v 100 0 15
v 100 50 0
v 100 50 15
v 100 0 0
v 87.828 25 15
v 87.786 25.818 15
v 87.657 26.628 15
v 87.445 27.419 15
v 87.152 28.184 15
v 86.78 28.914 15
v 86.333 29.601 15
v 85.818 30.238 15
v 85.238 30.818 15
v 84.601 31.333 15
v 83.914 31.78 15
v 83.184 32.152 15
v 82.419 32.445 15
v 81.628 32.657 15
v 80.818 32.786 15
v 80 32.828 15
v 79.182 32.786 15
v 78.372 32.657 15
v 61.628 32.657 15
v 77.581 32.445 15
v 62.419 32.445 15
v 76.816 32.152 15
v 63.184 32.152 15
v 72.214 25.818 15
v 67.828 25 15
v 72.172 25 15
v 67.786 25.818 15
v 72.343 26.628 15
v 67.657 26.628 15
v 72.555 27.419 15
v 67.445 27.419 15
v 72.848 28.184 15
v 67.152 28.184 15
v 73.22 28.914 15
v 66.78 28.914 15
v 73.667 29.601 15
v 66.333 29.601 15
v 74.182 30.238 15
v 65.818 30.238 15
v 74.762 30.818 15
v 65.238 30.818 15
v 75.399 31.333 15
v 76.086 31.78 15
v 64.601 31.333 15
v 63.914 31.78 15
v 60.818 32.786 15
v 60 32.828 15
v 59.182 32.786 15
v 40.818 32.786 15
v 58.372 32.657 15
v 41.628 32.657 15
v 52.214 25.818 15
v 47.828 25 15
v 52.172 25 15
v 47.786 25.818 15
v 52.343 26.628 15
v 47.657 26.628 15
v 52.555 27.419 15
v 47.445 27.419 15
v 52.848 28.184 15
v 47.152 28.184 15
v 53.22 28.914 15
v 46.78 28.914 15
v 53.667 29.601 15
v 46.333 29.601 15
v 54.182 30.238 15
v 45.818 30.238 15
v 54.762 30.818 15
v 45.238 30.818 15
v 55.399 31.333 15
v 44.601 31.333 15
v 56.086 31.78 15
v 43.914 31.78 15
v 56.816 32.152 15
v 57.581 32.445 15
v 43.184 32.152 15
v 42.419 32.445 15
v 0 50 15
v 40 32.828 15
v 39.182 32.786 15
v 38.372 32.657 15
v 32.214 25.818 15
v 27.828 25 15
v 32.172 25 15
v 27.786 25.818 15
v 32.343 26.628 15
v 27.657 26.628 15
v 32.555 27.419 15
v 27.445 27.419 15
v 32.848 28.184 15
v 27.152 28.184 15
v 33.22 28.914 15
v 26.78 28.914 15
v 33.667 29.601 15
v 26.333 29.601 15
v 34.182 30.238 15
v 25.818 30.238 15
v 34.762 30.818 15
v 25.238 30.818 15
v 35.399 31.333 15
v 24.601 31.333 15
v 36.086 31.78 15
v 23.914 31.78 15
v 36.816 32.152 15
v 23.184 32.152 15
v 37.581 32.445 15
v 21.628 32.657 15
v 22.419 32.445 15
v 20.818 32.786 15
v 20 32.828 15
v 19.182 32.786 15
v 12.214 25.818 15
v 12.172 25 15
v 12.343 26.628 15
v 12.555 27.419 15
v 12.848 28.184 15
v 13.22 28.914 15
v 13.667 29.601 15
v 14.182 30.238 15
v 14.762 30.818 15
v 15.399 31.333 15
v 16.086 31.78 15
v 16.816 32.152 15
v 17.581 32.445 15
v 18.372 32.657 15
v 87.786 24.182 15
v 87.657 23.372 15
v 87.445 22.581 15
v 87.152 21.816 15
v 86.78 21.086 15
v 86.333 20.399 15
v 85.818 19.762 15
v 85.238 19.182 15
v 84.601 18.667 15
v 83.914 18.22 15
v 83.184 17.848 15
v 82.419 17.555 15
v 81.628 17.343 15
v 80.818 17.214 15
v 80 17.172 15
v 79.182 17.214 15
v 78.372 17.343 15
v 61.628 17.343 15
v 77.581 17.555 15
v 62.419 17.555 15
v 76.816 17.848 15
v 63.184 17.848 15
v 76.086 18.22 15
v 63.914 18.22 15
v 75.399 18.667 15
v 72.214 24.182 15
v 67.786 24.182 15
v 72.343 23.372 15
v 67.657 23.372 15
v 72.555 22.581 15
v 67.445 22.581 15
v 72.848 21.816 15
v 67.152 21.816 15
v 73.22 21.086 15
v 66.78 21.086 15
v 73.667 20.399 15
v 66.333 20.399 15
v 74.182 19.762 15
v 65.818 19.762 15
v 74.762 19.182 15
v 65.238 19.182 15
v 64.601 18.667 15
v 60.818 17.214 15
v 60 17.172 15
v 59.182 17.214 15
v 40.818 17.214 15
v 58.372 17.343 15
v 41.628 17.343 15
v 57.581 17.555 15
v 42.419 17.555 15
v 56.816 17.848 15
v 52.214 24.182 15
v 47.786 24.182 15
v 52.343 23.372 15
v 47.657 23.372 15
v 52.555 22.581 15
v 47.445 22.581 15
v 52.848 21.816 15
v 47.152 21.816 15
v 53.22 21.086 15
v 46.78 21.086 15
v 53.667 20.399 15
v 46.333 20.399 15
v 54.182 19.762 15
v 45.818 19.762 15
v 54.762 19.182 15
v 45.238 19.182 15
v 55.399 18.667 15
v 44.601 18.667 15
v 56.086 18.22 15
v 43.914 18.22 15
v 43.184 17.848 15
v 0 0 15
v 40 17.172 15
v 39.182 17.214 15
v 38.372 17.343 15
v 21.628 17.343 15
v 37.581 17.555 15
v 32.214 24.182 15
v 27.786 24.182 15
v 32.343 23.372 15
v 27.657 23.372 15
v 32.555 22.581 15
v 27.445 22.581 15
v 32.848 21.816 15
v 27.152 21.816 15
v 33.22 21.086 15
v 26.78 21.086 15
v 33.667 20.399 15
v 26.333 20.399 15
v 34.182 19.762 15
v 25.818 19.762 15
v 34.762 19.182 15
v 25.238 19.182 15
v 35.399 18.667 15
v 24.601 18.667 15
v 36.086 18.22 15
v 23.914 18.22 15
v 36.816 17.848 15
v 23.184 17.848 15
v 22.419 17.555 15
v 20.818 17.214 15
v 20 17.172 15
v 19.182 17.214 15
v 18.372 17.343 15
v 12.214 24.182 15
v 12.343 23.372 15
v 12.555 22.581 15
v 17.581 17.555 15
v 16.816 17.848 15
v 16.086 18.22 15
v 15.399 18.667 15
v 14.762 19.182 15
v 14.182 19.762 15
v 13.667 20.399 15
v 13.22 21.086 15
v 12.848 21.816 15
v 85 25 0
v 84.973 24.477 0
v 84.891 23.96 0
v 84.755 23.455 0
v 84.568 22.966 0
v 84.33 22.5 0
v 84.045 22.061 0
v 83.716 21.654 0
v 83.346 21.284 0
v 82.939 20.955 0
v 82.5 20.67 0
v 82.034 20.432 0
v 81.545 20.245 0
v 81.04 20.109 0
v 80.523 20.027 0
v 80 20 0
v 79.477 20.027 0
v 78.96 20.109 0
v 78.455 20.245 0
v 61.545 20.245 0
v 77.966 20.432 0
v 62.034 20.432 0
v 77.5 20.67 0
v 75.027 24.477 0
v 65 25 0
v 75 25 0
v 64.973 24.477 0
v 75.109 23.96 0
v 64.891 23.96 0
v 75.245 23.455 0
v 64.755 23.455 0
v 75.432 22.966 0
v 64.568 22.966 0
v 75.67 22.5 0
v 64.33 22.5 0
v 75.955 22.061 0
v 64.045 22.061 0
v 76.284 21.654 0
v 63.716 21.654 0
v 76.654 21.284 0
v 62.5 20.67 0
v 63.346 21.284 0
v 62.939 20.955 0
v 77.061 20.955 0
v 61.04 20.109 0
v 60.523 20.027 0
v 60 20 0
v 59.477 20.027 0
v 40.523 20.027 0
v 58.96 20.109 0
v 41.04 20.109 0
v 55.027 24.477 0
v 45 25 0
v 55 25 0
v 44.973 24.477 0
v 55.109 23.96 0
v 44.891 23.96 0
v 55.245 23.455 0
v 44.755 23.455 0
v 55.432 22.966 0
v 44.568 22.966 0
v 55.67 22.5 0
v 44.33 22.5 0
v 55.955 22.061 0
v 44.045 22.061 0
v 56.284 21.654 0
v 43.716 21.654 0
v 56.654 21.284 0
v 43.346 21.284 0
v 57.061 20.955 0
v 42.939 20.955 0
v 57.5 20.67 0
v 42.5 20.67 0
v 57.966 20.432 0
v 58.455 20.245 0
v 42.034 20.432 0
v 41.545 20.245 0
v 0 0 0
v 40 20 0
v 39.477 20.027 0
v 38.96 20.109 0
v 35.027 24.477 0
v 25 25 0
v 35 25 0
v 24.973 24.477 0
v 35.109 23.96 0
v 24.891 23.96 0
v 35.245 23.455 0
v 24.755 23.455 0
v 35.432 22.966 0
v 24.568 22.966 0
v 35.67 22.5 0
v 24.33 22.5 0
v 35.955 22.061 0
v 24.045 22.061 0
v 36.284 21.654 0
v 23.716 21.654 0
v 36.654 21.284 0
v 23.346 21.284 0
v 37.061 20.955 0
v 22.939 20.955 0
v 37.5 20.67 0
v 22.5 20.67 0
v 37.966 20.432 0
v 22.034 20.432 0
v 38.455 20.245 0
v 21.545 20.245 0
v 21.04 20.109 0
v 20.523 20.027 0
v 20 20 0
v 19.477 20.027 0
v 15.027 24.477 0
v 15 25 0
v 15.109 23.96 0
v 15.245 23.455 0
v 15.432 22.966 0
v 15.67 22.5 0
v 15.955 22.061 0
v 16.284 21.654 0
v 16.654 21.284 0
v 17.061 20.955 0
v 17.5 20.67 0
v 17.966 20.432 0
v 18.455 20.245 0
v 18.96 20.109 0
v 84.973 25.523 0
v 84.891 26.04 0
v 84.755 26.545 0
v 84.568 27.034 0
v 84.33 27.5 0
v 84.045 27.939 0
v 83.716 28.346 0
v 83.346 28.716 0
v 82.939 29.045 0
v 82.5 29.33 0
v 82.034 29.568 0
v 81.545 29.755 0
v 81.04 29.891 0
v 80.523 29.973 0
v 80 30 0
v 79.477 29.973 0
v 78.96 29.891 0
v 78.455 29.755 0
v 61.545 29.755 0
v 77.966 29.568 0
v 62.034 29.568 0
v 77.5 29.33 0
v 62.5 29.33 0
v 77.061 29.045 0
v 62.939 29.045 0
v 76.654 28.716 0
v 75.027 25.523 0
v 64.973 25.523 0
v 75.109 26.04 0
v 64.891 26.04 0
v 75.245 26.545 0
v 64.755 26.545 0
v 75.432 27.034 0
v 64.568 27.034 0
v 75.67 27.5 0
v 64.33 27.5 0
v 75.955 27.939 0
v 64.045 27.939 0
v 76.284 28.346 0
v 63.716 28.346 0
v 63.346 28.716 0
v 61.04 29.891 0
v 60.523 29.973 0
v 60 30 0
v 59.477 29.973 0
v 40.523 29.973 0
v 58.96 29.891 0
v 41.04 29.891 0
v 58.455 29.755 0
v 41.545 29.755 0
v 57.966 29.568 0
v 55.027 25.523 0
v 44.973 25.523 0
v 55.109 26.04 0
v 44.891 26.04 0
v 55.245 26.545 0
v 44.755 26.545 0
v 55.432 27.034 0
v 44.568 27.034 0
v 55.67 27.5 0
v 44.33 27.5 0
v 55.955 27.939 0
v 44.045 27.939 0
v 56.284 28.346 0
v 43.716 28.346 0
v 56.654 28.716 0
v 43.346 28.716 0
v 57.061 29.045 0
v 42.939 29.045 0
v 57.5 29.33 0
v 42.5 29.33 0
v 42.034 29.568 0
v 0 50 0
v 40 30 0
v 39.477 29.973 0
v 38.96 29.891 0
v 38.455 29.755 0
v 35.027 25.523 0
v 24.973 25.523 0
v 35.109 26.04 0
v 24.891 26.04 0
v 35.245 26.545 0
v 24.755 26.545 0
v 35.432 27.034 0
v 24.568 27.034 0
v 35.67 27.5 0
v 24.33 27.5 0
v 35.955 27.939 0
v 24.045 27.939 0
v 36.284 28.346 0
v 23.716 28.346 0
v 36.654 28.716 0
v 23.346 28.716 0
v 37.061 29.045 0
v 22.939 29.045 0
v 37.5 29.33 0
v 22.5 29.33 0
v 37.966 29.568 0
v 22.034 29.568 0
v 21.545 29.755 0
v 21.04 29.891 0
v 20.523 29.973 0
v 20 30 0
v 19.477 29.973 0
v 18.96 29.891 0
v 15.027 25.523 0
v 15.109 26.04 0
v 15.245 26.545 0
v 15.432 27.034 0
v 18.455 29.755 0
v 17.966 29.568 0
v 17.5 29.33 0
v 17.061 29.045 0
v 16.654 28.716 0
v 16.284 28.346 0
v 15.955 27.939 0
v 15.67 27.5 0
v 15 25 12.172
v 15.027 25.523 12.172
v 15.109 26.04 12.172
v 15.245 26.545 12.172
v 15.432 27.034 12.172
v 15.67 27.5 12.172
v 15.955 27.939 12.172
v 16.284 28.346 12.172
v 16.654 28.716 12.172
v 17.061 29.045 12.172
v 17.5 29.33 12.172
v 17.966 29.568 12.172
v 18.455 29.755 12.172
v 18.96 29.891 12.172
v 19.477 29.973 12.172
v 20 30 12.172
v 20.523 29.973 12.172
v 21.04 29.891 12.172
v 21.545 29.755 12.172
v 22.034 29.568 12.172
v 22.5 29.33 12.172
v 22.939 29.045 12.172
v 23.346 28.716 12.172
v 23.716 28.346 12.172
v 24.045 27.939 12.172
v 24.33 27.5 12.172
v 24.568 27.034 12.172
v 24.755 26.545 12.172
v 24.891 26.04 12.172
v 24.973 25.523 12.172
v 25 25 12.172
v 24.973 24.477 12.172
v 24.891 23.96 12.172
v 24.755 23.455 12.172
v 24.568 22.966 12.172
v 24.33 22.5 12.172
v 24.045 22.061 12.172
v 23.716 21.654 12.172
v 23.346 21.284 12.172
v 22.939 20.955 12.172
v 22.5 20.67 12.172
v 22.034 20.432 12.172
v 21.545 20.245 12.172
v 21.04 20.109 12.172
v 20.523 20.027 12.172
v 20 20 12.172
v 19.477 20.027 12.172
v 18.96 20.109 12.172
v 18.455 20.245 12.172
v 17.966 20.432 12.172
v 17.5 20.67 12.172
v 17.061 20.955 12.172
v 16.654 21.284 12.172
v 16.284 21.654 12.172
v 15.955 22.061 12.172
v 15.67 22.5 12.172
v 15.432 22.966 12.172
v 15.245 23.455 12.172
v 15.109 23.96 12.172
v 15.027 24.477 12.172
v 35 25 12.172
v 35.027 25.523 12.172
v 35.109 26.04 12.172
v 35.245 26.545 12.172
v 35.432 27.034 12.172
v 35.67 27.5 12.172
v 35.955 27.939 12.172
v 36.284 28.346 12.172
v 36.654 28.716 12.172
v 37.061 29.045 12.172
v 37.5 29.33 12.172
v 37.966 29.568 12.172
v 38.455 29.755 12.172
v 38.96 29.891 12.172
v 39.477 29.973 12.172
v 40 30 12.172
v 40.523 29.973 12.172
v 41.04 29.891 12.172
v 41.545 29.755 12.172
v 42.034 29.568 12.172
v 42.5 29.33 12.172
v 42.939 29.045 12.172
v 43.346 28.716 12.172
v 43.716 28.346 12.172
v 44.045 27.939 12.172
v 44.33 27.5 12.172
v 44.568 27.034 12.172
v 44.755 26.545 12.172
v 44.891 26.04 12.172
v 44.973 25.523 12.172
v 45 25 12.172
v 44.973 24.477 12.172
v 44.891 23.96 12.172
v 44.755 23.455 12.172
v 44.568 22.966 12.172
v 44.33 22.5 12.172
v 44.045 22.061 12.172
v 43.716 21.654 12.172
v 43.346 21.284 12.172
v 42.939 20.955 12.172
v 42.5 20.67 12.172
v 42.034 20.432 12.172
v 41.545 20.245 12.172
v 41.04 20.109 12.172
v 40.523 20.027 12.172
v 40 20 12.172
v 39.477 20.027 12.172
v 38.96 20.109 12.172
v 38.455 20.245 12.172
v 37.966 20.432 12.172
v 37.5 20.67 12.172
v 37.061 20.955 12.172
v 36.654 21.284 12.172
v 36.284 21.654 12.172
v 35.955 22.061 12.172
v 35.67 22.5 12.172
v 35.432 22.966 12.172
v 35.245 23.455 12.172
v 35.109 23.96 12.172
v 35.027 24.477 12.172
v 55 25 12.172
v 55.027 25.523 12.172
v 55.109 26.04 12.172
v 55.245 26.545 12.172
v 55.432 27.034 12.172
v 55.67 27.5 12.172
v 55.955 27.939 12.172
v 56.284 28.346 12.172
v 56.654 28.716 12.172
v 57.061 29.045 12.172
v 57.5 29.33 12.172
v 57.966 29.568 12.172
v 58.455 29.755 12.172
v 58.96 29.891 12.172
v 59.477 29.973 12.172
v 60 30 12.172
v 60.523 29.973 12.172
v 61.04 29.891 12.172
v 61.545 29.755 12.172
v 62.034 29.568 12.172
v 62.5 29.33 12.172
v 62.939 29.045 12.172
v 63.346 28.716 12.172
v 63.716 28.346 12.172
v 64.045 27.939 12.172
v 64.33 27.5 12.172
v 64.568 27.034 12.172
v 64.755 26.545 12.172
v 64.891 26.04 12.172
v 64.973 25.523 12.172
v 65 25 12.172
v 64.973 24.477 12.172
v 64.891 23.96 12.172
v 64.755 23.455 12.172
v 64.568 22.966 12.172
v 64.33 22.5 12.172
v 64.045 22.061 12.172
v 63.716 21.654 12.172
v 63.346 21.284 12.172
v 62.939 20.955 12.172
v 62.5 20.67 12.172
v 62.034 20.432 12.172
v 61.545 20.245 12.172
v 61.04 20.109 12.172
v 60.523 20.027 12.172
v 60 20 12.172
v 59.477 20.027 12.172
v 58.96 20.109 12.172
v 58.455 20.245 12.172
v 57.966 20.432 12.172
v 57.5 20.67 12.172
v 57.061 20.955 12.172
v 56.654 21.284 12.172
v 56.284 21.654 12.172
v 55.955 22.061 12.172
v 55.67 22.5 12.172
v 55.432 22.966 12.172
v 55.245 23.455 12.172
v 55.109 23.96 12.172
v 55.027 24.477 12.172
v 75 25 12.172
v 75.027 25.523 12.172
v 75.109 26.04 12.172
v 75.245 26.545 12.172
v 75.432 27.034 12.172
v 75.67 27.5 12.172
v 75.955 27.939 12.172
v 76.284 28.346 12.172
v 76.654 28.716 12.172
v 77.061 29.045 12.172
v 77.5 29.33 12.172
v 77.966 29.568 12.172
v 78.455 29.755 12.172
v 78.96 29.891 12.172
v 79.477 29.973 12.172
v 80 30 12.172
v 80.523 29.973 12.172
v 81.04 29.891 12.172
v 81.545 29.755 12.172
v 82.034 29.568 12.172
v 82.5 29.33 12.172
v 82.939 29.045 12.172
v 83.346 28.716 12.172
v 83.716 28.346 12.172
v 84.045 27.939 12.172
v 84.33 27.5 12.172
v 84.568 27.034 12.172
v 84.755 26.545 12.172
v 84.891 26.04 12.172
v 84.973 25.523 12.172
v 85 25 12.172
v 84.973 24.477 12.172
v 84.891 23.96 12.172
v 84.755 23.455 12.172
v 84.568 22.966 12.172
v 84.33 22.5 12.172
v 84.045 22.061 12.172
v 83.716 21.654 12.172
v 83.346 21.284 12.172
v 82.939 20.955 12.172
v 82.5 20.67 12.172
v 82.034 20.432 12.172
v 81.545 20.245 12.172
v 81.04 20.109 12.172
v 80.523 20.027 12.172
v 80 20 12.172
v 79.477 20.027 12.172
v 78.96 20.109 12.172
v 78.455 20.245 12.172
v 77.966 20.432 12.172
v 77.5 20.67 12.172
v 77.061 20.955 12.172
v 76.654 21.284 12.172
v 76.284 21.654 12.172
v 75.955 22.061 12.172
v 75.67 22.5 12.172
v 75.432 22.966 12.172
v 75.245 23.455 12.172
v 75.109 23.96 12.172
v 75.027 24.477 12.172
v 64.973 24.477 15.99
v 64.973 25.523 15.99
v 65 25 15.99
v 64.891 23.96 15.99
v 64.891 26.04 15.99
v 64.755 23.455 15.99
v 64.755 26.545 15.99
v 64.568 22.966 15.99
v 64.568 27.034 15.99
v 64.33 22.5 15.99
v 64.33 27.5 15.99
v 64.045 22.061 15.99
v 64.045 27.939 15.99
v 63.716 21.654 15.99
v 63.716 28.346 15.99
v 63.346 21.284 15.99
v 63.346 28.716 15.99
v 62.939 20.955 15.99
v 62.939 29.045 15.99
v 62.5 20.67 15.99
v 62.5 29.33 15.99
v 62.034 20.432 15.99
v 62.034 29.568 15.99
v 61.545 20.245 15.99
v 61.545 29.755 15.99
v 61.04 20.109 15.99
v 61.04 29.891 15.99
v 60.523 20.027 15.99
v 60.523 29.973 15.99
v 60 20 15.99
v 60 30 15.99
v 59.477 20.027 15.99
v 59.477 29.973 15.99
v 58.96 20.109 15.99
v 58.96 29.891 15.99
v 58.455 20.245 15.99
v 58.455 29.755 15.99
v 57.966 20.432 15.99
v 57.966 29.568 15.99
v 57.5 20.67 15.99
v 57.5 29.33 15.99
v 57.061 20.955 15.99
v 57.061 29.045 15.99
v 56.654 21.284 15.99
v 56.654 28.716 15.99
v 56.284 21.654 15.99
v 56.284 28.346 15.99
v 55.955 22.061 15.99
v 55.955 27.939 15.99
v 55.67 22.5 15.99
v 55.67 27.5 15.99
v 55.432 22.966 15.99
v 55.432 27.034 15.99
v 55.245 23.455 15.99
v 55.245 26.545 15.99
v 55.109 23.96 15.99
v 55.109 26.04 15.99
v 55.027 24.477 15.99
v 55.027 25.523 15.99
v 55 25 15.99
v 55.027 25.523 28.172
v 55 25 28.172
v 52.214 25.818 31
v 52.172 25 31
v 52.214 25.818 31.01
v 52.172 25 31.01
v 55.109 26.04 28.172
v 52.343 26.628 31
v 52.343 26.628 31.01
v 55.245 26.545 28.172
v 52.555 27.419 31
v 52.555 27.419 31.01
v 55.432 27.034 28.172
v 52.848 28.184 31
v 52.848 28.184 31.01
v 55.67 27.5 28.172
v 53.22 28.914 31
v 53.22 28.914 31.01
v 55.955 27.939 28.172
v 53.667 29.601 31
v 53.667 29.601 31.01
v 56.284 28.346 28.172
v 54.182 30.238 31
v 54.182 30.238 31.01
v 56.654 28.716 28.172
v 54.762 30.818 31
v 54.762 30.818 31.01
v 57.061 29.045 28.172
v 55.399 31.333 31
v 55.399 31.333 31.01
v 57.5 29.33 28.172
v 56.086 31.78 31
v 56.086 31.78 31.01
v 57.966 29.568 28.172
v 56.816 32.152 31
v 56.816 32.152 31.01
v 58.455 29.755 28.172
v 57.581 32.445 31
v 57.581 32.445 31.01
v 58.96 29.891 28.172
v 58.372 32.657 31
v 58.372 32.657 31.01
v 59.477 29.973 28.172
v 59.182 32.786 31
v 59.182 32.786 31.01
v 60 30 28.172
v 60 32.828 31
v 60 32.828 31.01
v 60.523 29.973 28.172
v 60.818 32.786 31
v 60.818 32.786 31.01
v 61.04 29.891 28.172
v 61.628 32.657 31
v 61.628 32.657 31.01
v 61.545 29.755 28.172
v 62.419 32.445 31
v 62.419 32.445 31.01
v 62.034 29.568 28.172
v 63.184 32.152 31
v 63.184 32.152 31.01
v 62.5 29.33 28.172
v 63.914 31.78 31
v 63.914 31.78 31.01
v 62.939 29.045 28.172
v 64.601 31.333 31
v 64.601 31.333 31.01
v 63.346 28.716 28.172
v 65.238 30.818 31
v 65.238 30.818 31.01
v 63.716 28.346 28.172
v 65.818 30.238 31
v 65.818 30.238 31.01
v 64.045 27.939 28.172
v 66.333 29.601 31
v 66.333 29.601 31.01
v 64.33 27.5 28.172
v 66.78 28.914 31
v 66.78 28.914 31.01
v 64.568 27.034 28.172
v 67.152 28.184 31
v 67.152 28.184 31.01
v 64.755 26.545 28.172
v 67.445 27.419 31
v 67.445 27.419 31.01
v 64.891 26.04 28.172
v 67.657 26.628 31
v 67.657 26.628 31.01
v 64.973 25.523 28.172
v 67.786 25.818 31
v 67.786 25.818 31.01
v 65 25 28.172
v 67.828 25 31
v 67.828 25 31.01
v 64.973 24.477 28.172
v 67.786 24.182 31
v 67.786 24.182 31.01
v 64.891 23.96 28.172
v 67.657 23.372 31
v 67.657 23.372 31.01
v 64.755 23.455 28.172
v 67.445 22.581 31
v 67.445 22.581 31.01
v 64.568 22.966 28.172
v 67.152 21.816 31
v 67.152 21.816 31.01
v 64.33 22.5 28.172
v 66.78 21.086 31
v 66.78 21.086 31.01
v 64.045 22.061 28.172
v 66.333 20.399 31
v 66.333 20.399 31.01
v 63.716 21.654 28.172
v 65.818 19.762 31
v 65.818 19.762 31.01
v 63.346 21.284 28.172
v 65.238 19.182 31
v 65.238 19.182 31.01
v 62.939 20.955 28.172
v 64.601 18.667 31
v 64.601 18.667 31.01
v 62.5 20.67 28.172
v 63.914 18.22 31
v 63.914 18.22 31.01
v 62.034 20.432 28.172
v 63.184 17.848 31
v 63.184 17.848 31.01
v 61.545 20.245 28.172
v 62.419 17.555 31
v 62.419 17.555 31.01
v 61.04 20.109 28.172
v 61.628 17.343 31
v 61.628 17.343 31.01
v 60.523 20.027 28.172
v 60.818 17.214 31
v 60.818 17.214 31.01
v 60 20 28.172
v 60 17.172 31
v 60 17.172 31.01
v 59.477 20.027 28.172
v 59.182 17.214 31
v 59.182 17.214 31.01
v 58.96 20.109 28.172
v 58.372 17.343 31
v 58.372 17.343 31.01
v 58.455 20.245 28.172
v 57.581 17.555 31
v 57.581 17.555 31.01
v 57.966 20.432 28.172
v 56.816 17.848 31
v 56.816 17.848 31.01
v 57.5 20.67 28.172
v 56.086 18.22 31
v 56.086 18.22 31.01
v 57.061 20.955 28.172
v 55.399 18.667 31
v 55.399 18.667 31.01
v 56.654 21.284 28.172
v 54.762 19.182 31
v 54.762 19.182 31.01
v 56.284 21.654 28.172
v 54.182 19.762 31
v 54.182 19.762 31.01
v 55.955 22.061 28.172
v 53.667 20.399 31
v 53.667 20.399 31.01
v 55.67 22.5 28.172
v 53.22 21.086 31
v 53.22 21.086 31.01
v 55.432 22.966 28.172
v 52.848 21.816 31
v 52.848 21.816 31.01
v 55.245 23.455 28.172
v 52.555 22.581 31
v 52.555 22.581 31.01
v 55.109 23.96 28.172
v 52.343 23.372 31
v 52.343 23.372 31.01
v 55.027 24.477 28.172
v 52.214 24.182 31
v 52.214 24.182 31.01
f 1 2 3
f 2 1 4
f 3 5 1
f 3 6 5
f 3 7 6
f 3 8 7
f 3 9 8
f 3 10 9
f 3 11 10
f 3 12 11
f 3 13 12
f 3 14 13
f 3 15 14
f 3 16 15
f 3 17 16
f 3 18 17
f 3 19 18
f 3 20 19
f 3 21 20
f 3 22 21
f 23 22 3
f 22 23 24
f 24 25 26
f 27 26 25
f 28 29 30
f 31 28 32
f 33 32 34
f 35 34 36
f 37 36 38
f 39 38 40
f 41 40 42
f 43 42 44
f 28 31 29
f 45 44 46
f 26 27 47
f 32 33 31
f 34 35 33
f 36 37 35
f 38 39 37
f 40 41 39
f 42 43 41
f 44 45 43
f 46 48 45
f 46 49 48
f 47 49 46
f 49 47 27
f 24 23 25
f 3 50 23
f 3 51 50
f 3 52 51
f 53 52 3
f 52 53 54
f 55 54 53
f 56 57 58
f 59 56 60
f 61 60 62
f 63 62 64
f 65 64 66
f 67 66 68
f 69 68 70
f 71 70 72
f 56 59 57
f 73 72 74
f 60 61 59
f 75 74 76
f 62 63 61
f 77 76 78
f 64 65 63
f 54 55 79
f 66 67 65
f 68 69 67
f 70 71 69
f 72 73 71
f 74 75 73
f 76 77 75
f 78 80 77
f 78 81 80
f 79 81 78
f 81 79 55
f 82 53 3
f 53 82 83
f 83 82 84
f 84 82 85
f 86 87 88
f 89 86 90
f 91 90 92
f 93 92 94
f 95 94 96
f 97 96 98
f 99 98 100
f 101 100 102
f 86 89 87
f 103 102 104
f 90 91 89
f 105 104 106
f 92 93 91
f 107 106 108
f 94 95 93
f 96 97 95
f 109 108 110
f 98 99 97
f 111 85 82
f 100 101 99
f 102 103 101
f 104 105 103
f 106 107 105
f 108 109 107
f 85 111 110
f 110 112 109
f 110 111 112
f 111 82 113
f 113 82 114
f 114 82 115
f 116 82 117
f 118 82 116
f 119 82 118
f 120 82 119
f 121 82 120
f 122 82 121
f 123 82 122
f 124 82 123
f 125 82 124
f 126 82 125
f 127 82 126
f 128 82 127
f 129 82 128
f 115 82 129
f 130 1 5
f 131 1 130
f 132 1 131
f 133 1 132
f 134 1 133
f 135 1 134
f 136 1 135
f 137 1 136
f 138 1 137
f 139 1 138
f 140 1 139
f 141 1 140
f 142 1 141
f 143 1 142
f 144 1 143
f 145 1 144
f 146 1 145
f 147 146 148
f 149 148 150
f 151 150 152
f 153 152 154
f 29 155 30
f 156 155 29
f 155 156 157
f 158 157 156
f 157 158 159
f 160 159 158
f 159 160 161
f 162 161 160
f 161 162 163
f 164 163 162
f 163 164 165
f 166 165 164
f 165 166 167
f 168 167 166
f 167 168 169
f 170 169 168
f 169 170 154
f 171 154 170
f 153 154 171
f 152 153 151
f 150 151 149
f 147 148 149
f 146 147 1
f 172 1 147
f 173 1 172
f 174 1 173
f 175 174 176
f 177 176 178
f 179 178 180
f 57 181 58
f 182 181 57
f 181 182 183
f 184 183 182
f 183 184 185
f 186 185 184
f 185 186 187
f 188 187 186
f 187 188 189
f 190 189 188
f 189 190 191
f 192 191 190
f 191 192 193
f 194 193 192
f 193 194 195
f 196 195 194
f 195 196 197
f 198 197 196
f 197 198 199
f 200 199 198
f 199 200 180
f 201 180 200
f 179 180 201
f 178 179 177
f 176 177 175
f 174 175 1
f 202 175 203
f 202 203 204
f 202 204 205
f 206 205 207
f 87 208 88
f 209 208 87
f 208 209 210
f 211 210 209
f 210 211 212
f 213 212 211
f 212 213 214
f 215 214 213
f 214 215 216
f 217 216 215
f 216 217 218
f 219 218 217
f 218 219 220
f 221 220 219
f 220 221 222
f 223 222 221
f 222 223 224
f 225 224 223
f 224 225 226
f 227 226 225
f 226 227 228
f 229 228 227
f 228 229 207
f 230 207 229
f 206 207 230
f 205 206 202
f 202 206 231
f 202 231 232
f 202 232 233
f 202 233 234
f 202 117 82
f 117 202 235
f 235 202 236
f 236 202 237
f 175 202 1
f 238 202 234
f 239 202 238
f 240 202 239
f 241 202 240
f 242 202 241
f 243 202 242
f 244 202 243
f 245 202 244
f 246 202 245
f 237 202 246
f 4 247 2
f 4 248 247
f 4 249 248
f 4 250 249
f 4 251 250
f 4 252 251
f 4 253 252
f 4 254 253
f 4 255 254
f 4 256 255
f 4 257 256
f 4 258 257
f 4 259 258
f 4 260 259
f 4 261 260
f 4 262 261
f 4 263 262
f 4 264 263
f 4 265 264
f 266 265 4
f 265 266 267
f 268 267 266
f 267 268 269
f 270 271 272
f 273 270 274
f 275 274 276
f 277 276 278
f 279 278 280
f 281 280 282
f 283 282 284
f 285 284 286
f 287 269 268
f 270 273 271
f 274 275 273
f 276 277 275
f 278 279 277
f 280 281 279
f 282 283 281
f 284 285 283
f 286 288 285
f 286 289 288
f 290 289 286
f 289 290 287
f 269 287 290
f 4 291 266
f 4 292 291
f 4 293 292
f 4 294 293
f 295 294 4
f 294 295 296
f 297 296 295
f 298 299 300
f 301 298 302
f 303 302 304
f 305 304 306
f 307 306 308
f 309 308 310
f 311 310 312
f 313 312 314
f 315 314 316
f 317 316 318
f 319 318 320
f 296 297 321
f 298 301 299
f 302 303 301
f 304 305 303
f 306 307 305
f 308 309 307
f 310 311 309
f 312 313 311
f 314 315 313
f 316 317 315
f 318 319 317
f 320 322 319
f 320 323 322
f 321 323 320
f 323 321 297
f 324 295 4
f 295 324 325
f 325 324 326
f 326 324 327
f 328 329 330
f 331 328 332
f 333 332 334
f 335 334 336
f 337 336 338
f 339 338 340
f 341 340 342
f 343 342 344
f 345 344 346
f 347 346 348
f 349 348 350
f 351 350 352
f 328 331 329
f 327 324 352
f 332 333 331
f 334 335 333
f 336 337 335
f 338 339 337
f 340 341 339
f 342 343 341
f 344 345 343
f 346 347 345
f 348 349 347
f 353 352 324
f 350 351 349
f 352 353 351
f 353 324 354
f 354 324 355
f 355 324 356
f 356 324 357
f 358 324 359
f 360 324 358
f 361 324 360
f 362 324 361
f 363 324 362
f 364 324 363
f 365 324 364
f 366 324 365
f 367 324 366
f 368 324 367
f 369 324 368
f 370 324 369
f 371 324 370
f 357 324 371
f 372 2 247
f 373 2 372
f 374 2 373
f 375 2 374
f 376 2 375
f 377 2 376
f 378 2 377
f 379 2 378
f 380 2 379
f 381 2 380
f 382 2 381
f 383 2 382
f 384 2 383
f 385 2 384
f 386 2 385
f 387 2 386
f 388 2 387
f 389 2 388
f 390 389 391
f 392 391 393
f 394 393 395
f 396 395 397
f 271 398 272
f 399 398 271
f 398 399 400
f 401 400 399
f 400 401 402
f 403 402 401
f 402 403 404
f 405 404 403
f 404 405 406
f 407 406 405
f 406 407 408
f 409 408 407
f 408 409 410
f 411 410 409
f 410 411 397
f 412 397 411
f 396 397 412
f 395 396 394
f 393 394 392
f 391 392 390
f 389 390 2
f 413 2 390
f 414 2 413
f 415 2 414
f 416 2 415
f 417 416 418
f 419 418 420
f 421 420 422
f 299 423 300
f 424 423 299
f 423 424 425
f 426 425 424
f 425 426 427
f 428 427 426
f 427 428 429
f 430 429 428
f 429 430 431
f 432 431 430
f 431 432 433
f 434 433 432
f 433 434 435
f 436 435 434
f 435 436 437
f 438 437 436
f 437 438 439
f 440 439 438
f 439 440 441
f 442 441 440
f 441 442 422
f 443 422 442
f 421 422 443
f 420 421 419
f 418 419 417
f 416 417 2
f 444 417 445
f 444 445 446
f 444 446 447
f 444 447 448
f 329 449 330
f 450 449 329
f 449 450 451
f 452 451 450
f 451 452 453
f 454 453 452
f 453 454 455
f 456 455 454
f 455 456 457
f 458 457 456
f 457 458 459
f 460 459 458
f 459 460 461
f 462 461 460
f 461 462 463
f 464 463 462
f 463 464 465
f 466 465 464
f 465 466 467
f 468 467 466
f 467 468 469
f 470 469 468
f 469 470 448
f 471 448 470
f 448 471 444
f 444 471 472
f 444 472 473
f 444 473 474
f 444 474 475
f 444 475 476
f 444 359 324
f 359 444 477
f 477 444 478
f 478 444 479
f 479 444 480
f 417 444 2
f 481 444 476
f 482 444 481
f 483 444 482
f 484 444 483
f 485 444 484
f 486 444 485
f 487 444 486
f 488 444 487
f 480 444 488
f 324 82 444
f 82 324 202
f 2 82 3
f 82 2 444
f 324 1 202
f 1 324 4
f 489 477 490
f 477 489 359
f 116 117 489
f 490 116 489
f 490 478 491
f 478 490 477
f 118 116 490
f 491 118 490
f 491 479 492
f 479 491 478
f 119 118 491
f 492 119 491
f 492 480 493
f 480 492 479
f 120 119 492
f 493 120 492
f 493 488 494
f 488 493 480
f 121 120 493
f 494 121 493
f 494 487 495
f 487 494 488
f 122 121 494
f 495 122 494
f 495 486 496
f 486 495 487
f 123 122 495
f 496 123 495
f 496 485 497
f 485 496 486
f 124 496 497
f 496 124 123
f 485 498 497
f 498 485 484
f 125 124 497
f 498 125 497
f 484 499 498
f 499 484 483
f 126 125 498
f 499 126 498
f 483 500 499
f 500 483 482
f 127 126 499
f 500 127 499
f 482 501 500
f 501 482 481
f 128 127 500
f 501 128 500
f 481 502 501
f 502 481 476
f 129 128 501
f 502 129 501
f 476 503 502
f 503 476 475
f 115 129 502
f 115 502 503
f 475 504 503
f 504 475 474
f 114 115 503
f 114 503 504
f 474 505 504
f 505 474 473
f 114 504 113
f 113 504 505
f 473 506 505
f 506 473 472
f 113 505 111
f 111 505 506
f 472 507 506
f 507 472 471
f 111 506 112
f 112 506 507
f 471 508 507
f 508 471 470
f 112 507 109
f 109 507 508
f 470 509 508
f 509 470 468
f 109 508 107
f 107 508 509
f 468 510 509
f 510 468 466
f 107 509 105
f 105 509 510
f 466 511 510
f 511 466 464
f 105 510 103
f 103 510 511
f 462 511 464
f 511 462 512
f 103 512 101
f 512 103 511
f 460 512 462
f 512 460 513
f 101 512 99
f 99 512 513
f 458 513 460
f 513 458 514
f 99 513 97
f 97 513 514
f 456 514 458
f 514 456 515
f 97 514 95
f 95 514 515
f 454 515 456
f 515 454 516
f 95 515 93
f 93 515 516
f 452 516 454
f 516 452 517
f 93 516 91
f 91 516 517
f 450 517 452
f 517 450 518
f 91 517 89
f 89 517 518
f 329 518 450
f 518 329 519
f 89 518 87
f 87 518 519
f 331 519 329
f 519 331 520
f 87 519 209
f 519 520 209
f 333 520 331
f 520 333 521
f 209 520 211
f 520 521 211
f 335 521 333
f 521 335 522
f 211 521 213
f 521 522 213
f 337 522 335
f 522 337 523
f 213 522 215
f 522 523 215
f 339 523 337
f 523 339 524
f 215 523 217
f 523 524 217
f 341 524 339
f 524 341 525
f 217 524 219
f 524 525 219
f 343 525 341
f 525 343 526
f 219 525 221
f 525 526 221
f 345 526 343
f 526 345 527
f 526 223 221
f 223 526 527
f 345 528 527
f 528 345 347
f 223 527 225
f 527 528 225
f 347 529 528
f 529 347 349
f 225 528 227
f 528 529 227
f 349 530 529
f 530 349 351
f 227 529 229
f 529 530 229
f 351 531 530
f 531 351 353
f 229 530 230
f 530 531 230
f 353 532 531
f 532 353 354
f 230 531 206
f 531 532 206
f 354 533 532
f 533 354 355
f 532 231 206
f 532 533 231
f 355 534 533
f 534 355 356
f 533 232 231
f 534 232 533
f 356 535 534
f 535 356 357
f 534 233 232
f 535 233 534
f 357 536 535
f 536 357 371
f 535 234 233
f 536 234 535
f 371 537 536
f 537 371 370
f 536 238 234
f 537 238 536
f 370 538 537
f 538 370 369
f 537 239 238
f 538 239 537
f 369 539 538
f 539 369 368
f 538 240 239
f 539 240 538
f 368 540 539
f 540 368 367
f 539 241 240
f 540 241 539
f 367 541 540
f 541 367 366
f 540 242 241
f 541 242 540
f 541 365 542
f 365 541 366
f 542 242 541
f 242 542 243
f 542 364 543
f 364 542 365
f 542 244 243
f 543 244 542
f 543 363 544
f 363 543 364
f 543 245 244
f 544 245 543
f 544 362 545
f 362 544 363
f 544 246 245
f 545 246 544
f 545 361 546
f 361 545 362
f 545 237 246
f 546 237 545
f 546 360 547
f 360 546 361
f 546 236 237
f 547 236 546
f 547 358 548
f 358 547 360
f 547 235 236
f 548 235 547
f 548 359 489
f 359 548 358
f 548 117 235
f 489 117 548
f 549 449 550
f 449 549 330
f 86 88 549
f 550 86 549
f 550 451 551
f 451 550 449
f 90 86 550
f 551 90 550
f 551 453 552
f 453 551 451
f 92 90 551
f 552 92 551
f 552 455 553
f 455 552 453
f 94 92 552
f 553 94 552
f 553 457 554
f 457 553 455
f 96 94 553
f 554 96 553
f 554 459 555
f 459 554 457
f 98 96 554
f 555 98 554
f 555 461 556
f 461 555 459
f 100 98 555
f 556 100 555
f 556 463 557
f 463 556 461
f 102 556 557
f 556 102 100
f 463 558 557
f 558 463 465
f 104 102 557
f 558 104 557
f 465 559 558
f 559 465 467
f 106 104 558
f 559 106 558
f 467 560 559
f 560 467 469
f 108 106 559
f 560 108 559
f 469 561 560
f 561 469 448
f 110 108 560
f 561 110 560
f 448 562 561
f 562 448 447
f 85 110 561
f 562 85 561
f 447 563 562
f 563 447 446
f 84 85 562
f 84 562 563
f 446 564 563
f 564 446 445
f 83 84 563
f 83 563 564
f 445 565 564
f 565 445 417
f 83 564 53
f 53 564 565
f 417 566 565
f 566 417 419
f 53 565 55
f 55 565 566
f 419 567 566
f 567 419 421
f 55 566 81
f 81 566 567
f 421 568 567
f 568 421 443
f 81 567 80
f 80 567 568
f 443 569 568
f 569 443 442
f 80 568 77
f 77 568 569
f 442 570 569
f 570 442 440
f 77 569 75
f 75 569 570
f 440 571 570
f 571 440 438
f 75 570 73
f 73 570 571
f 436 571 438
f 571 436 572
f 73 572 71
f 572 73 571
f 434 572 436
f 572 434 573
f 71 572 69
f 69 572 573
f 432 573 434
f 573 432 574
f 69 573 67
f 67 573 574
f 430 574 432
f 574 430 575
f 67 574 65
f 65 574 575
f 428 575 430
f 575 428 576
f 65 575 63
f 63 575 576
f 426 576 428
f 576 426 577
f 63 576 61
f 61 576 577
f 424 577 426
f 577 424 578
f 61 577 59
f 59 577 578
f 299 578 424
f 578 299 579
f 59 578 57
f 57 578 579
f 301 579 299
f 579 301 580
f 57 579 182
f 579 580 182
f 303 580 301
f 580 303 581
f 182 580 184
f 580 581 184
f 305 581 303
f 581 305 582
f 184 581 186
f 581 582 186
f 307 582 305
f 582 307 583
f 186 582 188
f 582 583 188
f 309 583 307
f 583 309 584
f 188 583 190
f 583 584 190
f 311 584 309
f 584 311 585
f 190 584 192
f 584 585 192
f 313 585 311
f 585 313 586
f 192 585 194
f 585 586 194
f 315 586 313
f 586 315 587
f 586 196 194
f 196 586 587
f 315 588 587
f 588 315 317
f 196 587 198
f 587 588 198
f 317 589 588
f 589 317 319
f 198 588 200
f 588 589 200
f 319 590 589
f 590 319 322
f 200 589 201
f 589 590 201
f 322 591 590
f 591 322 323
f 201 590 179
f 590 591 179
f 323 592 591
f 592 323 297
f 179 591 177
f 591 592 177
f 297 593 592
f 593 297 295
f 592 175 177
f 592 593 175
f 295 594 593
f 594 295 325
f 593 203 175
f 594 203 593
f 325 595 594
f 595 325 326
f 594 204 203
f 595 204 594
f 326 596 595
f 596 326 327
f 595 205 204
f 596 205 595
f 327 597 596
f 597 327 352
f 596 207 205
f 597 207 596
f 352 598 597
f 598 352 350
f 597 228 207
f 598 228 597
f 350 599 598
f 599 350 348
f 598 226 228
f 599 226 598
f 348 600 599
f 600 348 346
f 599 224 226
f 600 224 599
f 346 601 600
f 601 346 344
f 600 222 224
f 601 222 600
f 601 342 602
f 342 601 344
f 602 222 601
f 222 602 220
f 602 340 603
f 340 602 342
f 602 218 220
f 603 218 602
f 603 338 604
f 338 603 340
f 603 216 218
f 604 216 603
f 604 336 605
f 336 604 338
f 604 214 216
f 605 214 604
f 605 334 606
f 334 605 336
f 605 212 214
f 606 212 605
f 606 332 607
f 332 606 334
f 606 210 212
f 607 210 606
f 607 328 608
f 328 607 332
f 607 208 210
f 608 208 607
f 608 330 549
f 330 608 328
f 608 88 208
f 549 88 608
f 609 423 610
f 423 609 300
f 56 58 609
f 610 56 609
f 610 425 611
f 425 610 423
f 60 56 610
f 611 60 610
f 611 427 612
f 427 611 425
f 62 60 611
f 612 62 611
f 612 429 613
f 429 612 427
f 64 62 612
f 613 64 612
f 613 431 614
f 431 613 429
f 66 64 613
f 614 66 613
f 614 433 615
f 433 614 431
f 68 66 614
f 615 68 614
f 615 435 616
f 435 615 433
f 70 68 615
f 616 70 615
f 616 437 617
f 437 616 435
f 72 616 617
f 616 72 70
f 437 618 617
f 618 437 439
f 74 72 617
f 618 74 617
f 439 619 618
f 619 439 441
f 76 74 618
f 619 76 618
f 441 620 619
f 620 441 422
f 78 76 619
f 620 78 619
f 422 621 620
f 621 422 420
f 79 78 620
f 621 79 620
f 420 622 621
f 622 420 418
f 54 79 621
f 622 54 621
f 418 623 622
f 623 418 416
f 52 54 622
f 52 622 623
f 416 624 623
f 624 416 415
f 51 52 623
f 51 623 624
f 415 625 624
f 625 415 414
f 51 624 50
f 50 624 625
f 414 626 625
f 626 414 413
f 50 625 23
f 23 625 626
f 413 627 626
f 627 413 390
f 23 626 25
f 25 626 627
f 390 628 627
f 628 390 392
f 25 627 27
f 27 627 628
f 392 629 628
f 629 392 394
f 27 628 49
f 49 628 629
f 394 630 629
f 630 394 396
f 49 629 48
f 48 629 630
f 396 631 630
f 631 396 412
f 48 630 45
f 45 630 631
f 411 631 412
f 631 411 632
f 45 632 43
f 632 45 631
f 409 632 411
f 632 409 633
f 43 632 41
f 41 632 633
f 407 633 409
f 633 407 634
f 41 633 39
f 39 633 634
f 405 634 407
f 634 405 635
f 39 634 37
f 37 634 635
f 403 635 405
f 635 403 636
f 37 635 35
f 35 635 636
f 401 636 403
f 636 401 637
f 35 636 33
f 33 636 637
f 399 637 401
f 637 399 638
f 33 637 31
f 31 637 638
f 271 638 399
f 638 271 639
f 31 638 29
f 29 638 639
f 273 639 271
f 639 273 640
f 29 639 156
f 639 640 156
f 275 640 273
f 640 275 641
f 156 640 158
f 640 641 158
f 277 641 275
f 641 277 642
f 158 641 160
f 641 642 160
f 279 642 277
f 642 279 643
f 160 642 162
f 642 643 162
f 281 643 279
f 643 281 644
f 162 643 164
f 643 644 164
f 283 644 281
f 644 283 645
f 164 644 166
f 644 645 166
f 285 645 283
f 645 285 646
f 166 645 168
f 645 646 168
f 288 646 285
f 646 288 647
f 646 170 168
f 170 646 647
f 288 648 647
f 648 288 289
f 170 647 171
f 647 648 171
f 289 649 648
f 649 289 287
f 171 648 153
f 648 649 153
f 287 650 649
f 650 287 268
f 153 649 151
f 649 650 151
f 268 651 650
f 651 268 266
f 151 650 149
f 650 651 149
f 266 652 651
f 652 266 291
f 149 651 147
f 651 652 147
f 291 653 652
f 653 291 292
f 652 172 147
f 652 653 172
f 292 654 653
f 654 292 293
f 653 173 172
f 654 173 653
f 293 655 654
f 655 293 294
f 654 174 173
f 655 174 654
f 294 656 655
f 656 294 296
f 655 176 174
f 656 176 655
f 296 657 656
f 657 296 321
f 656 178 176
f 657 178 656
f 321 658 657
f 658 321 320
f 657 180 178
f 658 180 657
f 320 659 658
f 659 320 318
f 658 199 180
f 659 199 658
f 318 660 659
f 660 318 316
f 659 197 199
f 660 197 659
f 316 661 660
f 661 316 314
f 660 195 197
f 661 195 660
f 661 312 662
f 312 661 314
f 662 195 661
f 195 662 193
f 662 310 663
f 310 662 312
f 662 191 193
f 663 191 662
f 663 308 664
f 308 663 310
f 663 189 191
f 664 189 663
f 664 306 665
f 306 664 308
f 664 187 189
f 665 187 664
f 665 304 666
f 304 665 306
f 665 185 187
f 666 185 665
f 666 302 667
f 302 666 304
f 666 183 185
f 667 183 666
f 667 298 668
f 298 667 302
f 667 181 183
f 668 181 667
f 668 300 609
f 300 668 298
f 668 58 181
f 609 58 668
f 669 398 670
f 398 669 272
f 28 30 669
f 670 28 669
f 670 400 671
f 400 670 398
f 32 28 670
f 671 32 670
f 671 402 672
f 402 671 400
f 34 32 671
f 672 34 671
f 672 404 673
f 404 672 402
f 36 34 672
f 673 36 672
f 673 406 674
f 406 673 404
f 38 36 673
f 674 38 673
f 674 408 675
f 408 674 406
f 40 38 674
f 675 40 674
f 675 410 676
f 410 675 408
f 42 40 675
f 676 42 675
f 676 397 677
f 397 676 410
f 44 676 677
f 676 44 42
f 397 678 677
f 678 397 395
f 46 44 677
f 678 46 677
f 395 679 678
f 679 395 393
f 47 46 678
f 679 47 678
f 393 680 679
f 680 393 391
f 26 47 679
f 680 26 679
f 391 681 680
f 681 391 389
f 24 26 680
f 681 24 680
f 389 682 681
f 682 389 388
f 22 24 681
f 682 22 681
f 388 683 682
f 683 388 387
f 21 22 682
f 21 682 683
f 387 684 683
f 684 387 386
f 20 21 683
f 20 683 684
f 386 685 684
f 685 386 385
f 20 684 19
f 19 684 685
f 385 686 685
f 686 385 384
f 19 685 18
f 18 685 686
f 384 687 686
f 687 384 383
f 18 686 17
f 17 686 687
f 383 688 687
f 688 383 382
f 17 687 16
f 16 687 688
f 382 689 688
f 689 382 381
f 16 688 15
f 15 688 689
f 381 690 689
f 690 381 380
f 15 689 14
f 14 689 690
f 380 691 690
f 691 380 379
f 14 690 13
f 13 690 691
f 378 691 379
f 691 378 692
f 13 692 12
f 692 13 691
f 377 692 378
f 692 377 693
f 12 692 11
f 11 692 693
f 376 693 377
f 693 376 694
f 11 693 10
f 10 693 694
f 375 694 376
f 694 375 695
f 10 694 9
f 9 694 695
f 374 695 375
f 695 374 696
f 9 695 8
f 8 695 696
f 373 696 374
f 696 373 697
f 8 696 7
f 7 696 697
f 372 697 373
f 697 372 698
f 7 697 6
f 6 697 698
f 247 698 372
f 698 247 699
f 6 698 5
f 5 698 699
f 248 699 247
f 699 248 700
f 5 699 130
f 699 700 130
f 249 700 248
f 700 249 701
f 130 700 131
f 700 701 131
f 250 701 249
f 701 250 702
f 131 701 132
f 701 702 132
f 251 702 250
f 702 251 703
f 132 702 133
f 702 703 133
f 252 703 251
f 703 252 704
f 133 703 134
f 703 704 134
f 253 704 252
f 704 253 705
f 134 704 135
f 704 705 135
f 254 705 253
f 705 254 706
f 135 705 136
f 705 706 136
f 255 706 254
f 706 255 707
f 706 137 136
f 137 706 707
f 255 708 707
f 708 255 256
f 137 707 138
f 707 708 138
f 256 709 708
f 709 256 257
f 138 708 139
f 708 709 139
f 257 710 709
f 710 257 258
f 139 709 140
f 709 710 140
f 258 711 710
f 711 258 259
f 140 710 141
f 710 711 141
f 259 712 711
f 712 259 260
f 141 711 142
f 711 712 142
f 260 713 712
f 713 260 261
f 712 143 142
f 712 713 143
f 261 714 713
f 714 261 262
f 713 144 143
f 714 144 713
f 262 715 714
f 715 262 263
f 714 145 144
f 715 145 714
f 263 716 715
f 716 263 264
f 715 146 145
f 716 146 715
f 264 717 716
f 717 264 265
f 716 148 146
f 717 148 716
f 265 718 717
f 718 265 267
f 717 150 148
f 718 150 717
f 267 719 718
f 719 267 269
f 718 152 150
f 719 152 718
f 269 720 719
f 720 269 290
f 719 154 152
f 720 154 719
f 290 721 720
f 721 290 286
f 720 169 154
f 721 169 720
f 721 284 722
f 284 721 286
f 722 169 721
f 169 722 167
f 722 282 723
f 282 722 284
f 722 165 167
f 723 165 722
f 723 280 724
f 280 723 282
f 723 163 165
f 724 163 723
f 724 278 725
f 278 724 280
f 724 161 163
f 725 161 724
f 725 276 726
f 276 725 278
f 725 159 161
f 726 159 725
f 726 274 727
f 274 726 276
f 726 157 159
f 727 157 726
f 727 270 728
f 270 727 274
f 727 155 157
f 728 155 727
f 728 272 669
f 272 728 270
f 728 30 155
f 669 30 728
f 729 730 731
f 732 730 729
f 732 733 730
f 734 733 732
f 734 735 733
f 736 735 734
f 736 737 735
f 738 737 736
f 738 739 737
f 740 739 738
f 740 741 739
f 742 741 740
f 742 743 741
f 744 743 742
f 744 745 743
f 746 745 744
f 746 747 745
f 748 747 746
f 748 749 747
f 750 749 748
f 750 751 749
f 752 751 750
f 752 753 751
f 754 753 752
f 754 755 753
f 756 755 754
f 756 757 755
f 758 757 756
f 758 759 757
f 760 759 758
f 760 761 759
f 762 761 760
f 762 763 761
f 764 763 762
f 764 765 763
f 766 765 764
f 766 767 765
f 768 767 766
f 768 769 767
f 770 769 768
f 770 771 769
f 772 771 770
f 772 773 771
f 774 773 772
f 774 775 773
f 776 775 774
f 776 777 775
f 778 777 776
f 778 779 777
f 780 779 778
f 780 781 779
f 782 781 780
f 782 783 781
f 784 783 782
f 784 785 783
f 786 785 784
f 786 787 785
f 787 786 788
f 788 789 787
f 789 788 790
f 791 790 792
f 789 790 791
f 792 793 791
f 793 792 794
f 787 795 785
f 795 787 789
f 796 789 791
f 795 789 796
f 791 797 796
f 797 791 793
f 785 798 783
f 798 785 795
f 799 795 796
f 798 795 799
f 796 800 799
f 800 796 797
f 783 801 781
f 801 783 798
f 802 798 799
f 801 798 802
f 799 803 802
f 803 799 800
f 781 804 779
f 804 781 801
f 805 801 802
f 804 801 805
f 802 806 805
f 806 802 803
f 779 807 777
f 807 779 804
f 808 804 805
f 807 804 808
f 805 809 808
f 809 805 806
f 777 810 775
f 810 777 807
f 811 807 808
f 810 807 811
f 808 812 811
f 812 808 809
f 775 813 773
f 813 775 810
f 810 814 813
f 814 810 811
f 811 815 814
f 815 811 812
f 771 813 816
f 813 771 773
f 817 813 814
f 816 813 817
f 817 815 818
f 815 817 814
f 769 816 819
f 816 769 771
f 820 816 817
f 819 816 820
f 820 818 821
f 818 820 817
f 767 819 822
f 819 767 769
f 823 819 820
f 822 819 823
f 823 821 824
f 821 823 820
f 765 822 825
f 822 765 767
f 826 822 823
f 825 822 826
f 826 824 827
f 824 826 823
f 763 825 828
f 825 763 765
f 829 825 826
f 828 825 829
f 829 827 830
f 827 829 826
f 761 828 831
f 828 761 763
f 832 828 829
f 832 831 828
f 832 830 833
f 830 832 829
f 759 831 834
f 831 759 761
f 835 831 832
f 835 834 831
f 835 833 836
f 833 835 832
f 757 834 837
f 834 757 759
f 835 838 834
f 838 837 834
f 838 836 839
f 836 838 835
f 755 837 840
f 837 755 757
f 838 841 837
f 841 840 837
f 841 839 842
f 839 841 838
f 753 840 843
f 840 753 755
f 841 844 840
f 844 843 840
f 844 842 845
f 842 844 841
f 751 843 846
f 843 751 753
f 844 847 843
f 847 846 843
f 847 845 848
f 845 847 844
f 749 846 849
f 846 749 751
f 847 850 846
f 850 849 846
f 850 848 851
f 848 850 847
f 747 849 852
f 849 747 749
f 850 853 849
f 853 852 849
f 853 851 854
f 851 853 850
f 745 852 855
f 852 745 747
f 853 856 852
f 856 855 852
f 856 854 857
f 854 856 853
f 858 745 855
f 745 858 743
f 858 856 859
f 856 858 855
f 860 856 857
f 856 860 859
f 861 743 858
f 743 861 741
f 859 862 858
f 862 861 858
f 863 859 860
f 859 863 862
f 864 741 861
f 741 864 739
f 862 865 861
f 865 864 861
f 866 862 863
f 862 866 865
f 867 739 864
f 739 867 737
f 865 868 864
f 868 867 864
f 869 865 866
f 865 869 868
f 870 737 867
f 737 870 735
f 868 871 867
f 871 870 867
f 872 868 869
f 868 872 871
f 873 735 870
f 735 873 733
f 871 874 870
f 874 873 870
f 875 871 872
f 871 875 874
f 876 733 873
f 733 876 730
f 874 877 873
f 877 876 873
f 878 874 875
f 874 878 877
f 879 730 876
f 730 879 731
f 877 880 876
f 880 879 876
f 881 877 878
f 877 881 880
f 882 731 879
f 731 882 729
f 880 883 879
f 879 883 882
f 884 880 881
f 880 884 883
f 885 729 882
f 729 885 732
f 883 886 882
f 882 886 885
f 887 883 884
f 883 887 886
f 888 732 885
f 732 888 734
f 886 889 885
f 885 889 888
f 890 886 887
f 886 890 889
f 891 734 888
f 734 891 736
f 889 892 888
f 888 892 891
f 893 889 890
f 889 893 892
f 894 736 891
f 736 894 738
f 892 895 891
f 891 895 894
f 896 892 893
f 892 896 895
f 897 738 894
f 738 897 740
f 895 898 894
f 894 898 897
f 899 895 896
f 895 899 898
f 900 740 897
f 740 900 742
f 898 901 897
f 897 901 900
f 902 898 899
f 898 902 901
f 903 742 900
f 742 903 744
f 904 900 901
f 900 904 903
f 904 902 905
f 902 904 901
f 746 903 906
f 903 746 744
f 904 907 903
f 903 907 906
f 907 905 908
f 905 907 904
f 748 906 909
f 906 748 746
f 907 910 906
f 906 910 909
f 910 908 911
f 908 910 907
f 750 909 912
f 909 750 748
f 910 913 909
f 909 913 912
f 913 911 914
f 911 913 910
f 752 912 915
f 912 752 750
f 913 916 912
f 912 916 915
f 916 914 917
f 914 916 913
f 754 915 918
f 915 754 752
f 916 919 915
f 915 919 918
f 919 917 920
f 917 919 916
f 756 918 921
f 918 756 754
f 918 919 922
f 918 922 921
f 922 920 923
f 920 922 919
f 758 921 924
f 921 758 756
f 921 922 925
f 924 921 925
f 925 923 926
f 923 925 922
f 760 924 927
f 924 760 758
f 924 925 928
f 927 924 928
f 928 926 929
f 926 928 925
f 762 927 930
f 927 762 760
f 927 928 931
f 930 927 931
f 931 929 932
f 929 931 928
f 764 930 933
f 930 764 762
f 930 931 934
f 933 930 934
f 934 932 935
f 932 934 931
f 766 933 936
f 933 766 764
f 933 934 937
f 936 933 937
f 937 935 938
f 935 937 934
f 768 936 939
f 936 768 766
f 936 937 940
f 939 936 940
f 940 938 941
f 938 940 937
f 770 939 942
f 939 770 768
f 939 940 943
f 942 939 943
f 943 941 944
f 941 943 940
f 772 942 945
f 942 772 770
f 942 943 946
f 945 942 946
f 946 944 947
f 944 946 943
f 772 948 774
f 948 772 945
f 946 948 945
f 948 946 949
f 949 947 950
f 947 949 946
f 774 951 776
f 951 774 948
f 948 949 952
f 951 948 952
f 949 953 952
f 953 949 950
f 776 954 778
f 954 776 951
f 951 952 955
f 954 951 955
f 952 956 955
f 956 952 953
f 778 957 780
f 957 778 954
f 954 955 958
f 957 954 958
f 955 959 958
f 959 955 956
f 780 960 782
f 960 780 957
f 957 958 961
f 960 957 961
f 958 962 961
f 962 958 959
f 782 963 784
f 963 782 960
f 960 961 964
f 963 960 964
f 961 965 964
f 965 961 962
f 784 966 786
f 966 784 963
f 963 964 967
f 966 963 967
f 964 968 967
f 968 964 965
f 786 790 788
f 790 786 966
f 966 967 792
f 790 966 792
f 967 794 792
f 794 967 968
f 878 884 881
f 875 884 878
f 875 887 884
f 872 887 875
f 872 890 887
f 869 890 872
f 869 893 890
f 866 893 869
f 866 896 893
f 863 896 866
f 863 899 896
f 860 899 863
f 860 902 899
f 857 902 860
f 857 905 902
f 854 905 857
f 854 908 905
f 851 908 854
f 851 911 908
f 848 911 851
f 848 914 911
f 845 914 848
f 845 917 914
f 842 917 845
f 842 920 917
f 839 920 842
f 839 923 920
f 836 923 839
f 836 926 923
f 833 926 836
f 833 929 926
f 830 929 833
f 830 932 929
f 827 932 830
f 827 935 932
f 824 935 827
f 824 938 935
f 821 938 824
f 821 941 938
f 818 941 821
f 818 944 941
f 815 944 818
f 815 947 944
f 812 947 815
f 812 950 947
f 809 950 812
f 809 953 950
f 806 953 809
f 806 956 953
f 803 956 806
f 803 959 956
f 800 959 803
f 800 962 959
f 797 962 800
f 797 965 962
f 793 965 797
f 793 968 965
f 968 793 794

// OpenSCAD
// Unit of length: Unit.MM
$fn = 60;

union()
{
   difference()
   {
      cube(size = [100.0, 50.0, 15.0], center = false);
      translate(v = [20.0, 25.0, 0.0])
      {
         rotate_extrude(angle = 360.0)
         {
            union()
            {
               polygon(points = [[0.0, 15.0], [0.0, 15.01], [5.0, 15.01], [5.0, 15.0], [5.0, 0.0], [5.0, -0.01], [0.0, -0.01], [0.0, 0.0]]);
               translate(v = [5.0, 15.0])
               {
                  polygon(points = [[-0.01, 0.01], [2.8284, 0.01], [2.8284, 0.0], [0.0, -2.8284], [-0.01, -2.8284]]);
               }
            }
         }
      }
      translate(v = [40.0, 25.0, 0.0])
      {
         rotate_extrude(angle = 360.0)
         {
            union()
            {
               polygon(points = [[0.0, 15.0], [0.0, 15.01], [5.0, 15.01], [5.0, 15.0], [5.0, 0.0], [5.0, -0.01], [0.0, -0.01], [0.0, 0.0]]);
               translate(v = [5.0, 15.0])
               {
                  polygon(points = [[-0.01, 0.01], [2.8284, 0.01], [2.8284, 0.0], [0.0, -2.8284], [-0.01, -2.8284]]);
               }
            }
         }
      }
      translate(v = [60.0, 25.0, 0.0])
      {
         rotate_extrude(angle = 360.0)
         {
            union()
            {
               polygon(points = [[0.0, 15.0], [0.0, 15.01], [5.0, 15.01], [5.0, 15.0], [5.0, 0.0], [5.0, -0.01], [0.0, -0.01], [0.0, 0.0]]);
               translate(v = [5.0, 15.0])
               {
                  polygon(points = [[-0.01, 0.01], [2.8284, 0.01], [2.8284, 0.0], [0.0, -2.8284], [-0.01, -2.8284]]);
               }
            }
         }
      }
      translate(v = [80.0, 25.0, 0.0])
      {
         rotate_extrude(angle = 360.0)
         {
            union()
            {
               polygon(points = [[0.0, 15.0], [0.0, 15.01], [5.0, 15.01], [5.0, 15.0], [5.0, 0.0], [5.0, -0.01], [0.0, -0.01], [0.0, 0.0]]);
               translate(v = [5.0, 15.0])
               {
                  polygon(points = [[-0.01, 0.01], [2.8284, 0.01], [2.8284, 0.0], [0.0, -2.8284], [-0.01, -2.8284]]);
               }
            }
         }
      }
   }
   translate(v = [60.0, 25.0, 16.0])
   {
      color(c = [1.0, 0.0, 0.0, 1.0])
      {
         rotate_extrude(angle = 360.0)
         {
            union()
            {
               polygon(points = [[0.0, 15.0], [0.0, 15.01], [5.0, 15.01], [5.0, 15.0], [5.0, 0.0], [5.0, -0.01], [0.0, -0.01], [0.0, 0.0]]);
               translate(v = [5.0, 15.0])
               {
                  polygon(points = [[-0.01, 0.01], [2.8284, 0.01], [2.8284, 0.0], [0.0, -2.8284], [-0.01, -2.8284]]);
               }
            }
         }
      }
   }
}
